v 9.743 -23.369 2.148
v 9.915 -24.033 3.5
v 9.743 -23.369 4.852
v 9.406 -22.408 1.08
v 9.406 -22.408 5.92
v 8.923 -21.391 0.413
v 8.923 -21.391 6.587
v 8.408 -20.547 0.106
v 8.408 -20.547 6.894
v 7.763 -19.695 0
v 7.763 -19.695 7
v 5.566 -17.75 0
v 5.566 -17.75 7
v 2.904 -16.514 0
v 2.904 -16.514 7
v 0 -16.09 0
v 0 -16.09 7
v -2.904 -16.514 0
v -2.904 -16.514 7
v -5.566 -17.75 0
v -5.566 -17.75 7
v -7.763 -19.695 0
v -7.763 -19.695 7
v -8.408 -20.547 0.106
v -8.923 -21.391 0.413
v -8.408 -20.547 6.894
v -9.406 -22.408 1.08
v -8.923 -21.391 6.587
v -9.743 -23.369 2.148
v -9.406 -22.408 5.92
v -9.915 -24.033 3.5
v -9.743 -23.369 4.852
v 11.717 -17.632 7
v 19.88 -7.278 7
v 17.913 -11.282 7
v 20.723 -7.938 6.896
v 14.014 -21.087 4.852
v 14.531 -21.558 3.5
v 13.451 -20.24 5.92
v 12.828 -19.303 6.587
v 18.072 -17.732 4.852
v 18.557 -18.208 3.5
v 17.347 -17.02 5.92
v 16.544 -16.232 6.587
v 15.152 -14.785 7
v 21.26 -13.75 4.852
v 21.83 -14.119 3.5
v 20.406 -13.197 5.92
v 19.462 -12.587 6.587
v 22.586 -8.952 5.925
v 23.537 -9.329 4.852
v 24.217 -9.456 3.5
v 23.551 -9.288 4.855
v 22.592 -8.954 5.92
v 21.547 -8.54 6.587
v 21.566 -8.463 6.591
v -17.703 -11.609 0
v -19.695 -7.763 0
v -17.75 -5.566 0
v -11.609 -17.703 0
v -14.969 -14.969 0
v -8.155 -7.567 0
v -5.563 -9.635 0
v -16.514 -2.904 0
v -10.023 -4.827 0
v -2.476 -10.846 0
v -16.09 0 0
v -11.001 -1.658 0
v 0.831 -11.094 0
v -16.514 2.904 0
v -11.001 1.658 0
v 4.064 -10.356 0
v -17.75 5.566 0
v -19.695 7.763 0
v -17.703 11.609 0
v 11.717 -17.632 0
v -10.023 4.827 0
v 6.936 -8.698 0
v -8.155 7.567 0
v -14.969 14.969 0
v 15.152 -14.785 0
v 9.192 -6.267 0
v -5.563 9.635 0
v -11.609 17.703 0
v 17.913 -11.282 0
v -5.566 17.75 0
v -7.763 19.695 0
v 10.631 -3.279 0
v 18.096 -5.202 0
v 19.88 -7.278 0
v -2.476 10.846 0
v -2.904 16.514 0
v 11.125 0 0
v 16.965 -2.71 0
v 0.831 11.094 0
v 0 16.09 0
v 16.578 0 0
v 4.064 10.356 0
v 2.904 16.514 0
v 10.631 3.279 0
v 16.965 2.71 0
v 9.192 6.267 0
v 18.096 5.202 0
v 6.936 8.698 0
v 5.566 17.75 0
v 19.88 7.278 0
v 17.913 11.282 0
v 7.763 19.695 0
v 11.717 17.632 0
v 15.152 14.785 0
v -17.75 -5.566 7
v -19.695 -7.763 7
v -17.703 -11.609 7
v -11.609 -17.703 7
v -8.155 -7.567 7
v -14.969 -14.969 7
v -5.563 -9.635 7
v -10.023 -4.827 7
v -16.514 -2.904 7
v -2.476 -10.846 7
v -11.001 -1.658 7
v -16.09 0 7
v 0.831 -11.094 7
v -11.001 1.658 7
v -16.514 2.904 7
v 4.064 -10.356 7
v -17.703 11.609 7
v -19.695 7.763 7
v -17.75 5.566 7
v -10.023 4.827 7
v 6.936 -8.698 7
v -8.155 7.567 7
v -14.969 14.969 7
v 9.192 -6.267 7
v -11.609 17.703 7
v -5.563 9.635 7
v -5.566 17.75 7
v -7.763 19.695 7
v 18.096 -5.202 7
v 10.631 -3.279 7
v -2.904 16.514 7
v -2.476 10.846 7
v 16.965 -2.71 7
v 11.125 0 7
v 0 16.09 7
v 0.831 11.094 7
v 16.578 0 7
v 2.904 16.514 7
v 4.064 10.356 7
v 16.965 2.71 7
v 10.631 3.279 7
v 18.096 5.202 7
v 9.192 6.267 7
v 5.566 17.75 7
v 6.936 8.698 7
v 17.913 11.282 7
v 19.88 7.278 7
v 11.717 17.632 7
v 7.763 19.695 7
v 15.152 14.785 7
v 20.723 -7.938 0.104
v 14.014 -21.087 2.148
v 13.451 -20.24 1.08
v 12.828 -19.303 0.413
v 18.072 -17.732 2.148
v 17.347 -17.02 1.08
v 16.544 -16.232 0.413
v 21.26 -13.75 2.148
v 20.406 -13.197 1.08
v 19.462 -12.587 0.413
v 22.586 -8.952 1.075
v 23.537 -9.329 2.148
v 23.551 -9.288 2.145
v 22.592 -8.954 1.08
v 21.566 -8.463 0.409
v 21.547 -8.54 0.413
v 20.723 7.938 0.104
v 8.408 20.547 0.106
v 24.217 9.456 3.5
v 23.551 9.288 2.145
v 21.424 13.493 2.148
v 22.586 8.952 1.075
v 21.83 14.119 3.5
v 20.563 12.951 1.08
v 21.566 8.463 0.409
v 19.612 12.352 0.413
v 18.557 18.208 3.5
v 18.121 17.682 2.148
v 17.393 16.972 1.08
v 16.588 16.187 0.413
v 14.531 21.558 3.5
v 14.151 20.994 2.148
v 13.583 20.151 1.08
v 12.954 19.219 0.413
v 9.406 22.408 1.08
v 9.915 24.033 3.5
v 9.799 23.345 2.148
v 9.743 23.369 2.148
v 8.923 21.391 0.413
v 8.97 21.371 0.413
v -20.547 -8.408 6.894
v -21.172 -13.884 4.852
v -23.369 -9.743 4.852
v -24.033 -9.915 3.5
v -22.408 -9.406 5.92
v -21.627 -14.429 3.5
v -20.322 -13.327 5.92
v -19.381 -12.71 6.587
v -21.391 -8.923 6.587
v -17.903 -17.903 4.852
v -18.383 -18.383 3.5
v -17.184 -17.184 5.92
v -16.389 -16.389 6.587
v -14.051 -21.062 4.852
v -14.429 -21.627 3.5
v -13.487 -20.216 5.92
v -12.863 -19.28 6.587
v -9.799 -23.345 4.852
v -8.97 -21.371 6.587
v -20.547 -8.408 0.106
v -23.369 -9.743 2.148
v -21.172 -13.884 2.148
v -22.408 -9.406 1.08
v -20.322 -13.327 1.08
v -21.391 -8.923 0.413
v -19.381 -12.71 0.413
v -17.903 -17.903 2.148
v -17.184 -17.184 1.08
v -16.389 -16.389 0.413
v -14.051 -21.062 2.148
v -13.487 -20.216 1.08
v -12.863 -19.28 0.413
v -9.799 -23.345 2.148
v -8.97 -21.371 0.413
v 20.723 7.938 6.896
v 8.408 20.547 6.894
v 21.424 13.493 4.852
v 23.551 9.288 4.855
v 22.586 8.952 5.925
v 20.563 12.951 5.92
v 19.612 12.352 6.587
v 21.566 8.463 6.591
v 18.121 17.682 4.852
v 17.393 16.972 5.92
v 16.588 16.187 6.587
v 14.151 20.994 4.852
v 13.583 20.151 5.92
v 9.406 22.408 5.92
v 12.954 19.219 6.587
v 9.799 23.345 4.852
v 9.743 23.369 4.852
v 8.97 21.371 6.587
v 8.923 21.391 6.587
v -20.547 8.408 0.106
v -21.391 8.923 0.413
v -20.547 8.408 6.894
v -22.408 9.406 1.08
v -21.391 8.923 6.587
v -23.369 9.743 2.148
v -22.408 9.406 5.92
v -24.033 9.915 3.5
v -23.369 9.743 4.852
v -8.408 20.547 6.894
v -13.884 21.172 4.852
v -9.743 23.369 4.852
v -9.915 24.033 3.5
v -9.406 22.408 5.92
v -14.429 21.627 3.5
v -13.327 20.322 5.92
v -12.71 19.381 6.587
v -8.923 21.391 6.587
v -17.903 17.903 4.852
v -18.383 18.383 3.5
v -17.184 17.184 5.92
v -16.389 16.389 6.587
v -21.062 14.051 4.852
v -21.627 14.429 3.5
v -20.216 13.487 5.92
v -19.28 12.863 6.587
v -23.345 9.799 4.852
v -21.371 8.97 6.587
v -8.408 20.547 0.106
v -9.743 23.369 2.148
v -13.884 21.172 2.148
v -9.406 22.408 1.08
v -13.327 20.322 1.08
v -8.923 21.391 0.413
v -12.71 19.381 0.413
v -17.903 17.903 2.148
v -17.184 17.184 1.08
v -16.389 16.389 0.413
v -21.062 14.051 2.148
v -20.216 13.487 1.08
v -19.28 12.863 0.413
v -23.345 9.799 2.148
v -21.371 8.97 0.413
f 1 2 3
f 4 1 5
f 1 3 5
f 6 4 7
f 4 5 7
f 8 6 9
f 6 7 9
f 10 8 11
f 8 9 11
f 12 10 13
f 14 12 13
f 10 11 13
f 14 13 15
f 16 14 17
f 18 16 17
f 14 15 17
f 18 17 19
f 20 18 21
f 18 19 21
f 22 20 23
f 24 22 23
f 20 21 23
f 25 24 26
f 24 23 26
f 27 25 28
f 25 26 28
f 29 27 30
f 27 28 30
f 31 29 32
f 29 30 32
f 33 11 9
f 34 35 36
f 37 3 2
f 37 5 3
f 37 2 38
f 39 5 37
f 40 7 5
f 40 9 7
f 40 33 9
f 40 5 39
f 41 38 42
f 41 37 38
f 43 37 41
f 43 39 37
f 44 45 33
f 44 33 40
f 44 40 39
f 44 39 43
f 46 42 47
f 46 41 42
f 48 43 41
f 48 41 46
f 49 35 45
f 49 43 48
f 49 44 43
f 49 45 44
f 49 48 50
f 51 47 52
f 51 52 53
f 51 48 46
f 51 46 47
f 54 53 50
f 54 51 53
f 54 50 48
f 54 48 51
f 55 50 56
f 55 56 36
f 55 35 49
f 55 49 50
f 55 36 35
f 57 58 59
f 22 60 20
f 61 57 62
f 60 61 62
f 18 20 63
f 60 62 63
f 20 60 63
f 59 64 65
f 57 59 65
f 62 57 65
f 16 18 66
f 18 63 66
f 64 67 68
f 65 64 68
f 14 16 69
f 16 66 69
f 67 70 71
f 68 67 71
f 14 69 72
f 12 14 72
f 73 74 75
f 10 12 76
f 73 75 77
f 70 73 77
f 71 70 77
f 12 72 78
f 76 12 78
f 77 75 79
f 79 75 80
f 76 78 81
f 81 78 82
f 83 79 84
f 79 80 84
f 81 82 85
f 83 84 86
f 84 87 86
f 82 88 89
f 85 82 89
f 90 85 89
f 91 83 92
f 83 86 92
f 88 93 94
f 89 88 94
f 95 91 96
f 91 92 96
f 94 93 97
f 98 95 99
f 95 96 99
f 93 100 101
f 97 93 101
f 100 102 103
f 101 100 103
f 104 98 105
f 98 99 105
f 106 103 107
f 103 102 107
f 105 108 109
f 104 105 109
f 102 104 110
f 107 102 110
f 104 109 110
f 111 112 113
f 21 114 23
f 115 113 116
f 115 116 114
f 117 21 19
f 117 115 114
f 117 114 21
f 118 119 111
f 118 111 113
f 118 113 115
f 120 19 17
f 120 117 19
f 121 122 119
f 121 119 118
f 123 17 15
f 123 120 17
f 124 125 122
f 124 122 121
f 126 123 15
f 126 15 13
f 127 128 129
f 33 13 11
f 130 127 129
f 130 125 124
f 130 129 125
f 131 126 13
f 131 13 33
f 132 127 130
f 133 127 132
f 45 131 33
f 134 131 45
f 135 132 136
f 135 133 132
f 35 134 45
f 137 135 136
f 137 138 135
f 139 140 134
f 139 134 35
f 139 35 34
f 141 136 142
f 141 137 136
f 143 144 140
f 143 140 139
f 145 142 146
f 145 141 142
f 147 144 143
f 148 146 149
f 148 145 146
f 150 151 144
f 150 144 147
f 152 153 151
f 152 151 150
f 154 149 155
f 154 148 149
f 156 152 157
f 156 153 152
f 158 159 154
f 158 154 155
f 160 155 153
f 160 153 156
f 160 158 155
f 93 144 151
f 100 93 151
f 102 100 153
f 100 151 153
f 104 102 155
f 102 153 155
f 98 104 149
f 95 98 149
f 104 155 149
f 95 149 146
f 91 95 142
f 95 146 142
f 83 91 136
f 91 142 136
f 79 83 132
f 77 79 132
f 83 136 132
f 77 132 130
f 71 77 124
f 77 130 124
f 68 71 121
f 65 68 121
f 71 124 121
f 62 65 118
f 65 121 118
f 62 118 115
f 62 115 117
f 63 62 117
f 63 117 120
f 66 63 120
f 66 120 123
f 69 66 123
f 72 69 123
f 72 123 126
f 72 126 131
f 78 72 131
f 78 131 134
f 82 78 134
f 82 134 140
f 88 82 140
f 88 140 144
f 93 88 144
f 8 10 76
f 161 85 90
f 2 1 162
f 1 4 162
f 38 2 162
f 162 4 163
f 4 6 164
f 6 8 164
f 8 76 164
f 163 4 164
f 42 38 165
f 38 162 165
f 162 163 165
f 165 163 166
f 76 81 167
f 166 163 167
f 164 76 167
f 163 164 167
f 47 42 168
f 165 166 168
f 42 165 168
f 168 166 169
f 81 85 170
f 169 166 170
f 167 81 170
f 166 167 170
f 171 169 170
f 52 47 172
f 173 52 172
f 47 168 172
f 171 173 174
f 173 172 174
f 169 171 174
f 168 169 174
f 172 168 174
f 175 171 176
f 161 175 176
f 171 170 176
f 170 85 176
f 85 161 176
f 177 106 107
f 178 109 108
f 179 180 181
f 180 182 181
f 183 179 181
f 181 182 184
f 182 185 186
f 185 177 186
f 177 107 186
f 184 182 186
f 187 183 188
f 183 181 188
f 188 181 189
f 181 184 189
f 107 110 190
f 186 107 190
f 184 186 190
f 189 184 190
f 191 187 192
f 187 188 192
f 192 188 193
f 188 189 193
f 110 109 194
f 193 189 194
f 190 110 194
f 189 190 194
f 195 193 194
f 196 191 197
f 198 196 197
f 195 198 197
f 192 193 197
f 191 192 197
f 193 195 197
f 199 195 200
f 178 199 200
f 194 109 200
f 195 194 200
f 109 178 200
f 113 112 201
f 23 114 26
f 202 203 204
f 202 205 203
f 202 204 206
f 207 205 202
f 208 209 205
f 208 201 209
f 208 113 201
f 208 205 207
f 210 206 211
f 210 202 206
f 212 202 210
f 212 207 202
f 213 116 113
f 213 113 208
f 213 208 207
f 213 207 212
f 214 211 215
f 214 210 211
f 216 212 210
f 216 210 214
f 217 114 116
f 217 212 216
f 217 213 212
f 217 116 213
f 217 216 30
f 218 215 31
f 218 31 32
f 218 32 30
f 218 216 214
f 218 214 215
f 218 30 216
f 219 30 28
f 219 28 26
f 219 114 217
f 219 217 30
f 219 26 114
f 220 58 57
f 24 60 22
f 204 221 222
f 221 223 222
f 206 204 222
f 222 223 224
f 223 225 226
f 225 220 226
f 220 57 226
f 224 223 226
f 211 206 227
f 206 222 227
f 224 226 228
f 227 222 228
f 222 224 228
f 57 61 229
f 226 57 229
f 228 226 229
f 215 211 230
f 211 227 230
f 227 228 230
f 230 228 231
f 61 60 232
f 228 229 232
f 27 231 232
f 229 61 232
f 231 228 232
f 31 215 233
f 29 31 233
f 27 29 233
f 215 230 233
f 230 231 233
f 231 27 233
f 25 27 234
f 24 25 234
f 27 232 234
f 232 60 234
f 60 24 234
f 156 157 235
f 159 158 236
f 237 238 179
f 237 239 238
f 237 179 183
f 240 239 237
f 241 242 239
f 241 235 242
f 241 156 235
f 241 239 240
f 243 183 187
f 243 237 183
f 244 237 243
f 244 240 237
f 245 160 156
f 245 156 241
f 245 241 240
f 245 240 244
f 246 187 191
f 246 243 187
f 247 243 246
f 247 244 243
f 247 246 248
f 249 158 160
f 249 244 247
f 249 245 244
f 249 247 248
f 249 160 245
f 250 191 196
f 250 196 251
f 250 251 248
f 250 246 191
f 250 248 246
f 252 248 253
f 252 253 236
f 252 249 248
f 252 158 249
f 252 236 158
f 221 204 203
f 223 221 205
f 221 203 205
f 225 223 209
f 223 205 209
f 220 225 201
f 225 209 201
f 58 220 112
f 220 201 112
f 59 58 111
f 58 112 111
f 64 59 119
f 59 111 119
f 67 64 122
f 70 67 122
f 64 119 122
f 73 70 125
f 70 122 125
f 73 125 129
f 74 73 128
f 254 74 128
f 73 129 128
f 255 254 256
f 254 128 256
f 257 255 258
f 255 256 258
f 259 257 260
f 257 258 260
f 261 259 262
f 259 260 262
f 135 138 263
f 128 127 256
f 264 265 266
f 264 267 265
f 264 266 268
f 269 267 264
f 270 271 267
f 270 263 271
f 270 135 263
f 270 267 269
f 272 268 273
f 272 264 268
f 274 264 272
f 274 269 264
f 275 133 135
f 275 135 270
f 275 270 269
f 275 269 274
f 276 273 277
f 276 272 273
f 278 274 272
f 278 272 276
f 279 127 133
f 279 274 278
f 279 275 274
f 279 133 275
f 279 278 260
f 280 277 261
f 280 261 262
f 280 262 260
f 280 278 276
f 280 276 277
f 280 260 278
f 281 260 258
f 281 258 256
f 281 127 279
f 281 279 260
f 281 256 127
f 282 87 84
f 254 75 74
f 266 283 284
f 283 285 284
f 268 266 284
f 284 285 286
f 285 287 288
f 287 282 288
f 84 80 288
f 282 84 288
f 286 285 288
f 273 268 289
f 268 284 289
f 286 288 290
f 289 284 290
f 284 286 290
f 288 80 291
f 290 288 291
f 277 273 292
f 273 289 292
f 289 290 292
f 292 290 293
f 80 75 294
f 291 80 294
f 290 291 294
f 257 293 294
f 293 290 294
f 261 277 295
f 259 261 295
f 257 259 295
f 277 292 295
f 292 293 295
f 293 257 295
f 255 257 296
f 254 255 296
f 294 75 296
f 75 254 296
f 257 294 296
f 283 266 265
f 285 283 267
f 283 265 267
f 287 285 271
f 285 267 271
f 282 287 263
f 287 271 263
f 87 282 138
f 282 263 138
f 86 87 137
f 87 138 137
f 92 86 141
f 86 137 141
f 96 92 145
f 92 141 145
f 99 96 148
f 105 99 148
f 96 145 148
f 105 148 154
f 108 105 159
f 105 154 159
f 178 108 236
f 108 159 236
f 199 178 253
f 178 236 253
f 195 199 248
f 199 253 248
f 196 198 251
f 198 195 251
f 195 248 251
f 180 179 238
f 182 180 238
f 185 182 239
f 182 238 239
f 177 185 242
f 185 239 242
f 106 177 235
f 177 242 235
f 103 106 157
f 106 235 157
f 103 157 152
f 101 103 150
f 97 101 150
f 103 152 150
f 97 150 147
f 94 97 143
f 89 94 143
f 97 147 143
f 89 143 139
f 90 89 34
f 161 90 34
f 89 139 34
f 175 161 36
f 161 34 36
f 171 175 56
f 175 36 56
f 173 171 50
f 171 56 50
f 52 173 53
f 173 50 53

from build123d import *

# Parameters (mm, degrees)
F0_R         = 26.25
F1_DEPTH     = 7
F2_R         = 11.125
F3_DEPTH     = 25.4
F4_R         = 10.16
F4_R_2       = 9.6723514766
F5_DEPTH     = 25.4
F6_T2_ANGLE  = 101.8963155292
F6_T4_ANGLE  = 100.8121389037
F6_T6_ANGLE  = 100.8121389037
F6_T8_ANGLE  = 100.8121389037
F6_T10_ANGLE = 100.8121389037
F6_T12_ANGLE = 101.8963155292
F6_T14_ANGLE = 101.8963155292
F6_T16_ANGLE = 101.8963155292


# Not quite as in the source:
# - a fillet or chamfer that OpenCascade refuses, or shapes differently, is made with other operations: its cross-section is extruded or revolved along the edge and cut away or added


with BuildPart() as f1:
    # F0 (on Top) → F1 (new body)
    with BuildSketch(Plane.XY):
        Circle(F0_R)
    extrude(amount=F1_DEPTH)

    # F2 (on face) → F3 (cut)
    with BuildSketch(Plane.XY.offset(7)):
        Circle(F2_R)
    extrude(amount=-F3_DEPTH, mode=Mode.SUBTRACT)

    # F4 (on face) → F5 (cut)
    with BuildSketch(Plane.XY.offset(7)):
        with Locations((0, -26.25)):
            Circle(F4_R)
        with Locations((-26.25, 0)):
            Circle(F4_R)
        with Locations((0, 26.25)):
            Circle(F4_R)
        with Locations((26.25, 0)):
            Circle(F4_R_2)
    extrude(amount=-F5_DEPTH, mode=Mode.SUBTRACT)

    # F6: fillet of radius 5.08 on 8 edges, made by hand

    # F6_s1 → F6_t2 (revolve, cut)
    with BuildSketch(Plane(origin=(0, 0, 0), x_dir=(0, 0, 1), z_dir=(-0.995551765, 0.0942161515, 0))):
        with BuildLine():
            ThreePointArc((5.08, -26.25), (1.4878975516, -24.7621024484), (0, -21.17))
            Line((0, -21.17), (0, -26.25))
            Line((0, -26.25), (5.08, -26.25))
        make_face()
    revolve(axis=Axis((0, 0, 0), (0, 0, 1)), revolution_arc=F6_T2_ANGLE, mode=Mode.SUBTRACT)

    # F6_s3 → F6_t4 (revolve, cut)
    with BuildSketch(Plane(origin=(0, 0, 0), x_dir=(0, 0, 1), z_dir=(0.0942137746, 0.9955519899, 0))):
        with BuildLine():
            ThreePointArc((5.08, -26.25), (1.4878975516, -24.7621024484), (0, -21.17))
            Line((0, -21.17), (0, -26.25))
            Line((0, -26.25), (5.08, -26.25))
        make_face()
    revolve(axis=Axis((0, 0, 0), (0, 0, 1)), revolution_arc=F6_T4_ANGLE, mode=Mode.SUBTRACT)

    # F6_s5 → F6_t6 (revolve, cut)
    with BuildSketch(Plane(origin=(0, 0, 0), x_dir=(0, 0, 1), z_dir=(0.9955519899, -0.0942137746, 0))):
        with BuildLine():
            ThreePointArc((5.08, -26.25), (1.4878975516, -24.7621024484), (0, -21.17))
            Line((0, -21.17), (0, -26.25))
            Line((0, -26.25), (5.08, -26.25))
        make_face()
    revolve(axis=Axis((0, 0, 0), (0, 0, 1)), revolution_arc=F6_T6_ANGLE, mode=Mode.SUBTRACT)

    # F6_s7 → F6_t8 (revolve, cut)
    with BuildSketch(Plane(origin=(0, 0, 0), x_dir=(0, 0, 1), z_dir=(0.9955519899, -0.0942137746, 0))):
        with BuildLine():
            ThreePointArc((1.92, -26.25), (5.5121024484, -24.7621024484), (7, -21.17))
            Line((7, -21.17), (7, -26.25))
            Line((7, -26.25), (1.92, -26.25))
        make_face()
    revolve(axis=Axis((0, 0, 7), (0, 0, 1)), revolution_arc=F6_T8_ANGLE, mode=Mode.SUBTRACT)

    # F6_s9 → F6_t10 (revolve, cut)
    with BuildSketch(Plane(origin=(0, 0, 0), x_dir=(0, 0, 1), z_dir=(0.0942137746, 0.9955519899, 0))):
        with BuildLine():
            ThreePointArc((1.92, -26.25), (5.5121024484, -24.7621024484), (7, -21.17))
            Line((7, -21.17), (7, -26.25))
            Line((7, -26.25), (1.92, -26.25))
        make_face()
    revolve(axis=Axis((0, 0, 7), (0, 0, 1)), revolution_arc=F6_T10_ANGLE, mode=Mode.SUBTRACT)

    # F6_s11 → F6_t12 (revolve, cut)
    with BuildSketch(Plane(origin=(0, 0, 0), x_dir=(0, 0, 1), z_dir=(-0.995551765, 0.0942161515, 0))):
        with BuildLine():
            ThreePointArc((1.92, -26.25), (5.5121024484, -24.7621024484), (7, -21.17))
            Line((7, -21.17), (7, -26.25))
            Line((7, -26.25), (1.92, -26.25))
        make_face()
    revolve(axis=Axis((0, 0, 7), (0, 0, 1)), revolution_arc=F6_T12_ANGLE, mode=Mode.SUBTRACT)

    # F6_s13 → F6_t14 (revolve, cut)
    with BuildSketch(Plane(origin=(0, 0, 0), x_dir=(0, 0, 1), z_dir=(-0.1130316961, -0.9935913826, 0))):
        with BuildLine():
            ThreePointArc((1.92, -26.25), (5.5121024484, -24.7621024484), (7, -21.17))
            Line((7, -21.17), (7, -26.25))
            Line((7, -26.25), (1.92, -26.25))
        make_face()
    revolve(axis=Axis((0, 0, 7), (0, 0, 1)), revolution_arc=F6_T14_ANGLE, mode=Mode.SUBTRACT)

    # F6_s15 → F6_t16 (revolve, cut)
    with BuildSketch(Plane(origin=(0, 0, 0), x_dir=(0, 0, 1), z_dir=(-0.1130316961, -0.9935913826, 0))):
        with BuildLine():
            ThreePointArc((5.08, -26.25), (1.4878975516, -24.7621024484), (0, -21.17))
            Line((0, -21.17), (0, -26.25))
            Line((0, -26.25), (5.08, -26.25))
        make_face()
    revolve(axis=Axis((0, 0, 0), (0, 0, 1)), revolution_arc=F6_T16_ANGLE, mode=Mode.SUBTRACT)


solid = f1.part
